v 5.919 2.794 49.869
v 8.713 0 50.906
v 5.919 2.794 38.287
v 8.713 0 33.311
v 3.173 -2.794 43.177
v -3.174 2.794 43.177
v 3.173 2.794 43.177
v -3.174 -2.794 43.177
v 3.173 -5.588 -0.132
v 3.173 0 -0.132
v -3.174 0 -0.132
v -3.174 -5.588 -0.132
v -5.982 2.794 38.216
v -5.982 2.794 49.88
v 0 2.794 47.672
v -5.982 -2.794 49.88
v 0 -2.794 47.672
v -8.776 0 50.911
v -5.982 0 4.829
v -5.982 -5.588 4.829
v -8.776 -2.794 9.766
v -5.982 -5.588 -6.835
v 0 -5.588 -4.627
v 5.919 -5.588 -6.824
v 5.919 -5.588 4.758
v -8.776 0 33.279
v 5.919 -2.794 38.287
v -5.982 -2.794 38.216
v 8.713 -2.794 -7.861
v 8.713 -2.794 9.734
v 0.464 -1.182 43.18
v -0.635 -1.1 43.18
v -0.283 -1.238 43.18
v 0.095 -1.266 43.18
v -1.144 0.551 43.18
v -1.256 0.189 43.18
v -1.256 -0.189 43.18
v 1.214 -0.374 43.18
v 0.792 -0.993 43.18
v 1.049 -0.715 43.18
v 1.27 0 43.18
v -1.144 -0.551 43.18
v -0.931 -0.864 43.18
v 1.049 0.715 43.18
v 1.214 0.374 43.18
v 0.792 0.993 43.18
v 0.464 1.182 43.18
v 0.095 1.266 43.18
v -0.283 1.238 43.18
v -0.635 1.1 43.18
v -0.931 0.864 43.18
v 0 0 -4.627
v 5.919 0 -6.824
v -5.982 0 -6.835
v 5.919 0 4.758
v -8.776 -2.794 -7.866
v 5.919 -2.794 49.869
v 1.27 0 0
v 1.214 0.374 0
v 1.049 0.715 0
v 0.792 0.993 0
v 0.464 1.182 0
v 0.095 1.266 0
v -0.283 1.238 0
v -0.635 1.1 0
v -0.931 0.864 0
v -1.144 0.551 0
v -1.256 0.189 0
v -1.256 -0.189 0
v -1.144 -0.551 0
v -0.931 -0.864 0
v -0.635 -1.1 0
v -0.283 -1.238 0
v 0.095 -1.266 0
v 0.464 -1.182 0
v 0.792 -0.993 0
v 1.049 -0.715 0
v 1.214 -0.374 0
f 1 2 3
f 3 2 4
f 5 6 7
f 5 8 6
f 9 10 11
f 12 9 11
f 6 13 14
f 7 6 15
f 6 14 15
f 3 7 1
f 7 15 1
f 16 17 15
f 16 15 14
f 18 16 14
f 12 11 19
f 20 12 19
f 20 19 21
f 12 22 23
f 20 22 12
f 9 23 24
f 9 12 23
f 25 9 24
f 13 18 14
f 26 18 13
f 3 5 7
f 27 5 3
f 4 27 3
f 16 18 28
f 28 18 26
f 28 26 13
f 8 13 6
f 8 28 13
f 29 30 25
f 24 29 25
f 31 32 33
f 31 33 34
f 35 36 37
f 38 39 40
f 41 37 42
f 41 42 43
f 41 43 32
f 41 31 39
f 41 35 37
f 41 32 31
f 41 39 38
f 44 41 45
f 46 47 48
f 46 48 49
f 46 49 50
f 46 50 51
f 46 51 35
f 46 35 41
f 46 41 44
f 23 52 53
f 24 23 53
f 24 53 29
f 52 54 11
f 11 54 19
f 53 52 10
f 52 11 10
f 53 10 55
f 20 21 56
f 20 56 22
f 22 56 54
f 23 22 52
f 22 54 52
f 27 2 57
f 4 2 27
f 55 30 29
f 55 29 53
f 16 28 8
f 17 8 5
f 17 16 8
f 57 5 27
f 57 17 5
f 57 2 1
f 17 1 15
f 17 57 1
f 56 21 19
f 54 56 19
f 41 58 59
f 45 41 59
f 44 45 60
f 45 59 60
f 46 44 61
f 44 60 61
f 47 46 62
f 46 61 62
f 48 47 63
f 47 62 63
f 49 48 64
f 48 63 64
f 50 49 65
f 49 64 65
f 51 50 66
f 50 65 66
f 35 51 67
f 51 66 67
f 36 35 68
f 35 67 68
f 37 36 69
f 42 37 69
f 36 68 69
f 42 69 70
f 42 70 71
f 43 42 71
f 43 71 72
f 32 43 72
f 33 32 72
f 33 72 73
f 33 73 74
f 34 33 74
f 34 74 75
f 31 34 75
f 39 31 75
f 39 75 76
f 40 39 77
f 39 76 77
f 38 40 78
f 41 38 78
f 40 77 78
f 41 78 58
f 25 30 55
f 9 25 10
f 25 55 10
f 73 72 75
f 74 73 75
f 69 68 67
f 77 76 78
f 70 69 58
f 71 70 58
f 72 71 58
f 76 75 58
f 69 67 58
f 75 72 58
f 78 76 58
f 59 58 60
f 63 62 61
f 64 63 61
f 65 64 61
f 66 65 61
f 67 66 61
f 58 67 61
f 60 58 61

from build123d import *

# Parameters (mm, degrees)
F0_R        = 1.27
F1_DEPTH    = 43.18
F3_DEPTH    = 2.794
F4_T1_DEPTH = 48.6435811926
F5_DEPTH    = 5.588
F6_T1_DEPTH = 48.6435811926


# Not quite as in the source:
# - a fillet or chamfer that OpenCascade refuses, or shapes differently, is made with other operations: its cross-section is extruded or revolved along the edge and cut away or added


with BuildPart() as f1:
    # F0 (on Top) → F1 (new body)
    with BuildSketch(Plane.XY):
        Circle(F0_R)
    extrude(amount=F1_DEPTH)


with BuildPart() as f3:
    # F2 (on Front) → F3 (new body, symmetric)
    with BuildSketch(Plane.XZ):
        Polygon((-3.1743557192, 43.1767851114), (3.1734784134, 43.1767851114), (10.9989056364, 29.2393378913), (10.9989056364, 51.7546199262), (0, 47.6719401777), (-11.0619841143, 51.7546199262), (-11.0619841143, 29.2393378913), align=None)
    extrude(amount=F3_DEPTH, both=True)

    # F4: chamfer of 5.08 on 4 edges, made by hand

    # F4_s2 → F4_t1 (cut)
    with BuildSketch(Plane.XY.offset(16.1751883125)):
        Polygon((10.9989056364, 2.286), (5.9189056364, -2.794), (10.9989056364, -2.794), align=None)
        Polygon((10.9989056364, -2.286), (5.9189056364, 2.794), (10.9989056364, 2.794), align=None)
        Polygon((-11.0619841143, 2.286), (-5.9819841143, -2.794), (-11.0619841143, -2.794), align=None)
        Polygon((-11.0619841143, -2.286), (-5.9819841143, 2.794), (-11.0619841143, 2.794), align=None)
    extrude(amount=F4_T1_DEPTH, mode=Mode.SUBTRACT)


with BuildPart() as f5:
    # F2 (on Front) → F5 (new body)
    with BuildSketch(Plane.XZ):
        Polygon((10.9989056364, 13.8055048883), (3.1734784134, -0.1319423318), (-3.1743557192, -0.1319423318), (-11.0619841143, 13.8055048883), (-11.0619841143, -8.7097771466), (0, -4.627097398), (10.9989056364, -8.7097771466), align=None)
    extrude(amount=F5_DEPTH)

    # F6: chamfer of 5.08 on 4 edges, made by hand

    # F6_s2 → F6_t1 (cut)
    with BuildSketch(Plane.XY.offset(-21.7739267254)):
        Polygon((-11.0619841143, -5.08), (-5.9819841143, 0), (-11.0619841143, 0), align=None)
        Polygon((-11.0619841143, -0.508), (-5.9819841143, -5.588), (-11.0619841143, -5.588), align=None)
        Polygon((10.9989056364, -0.508), (5.9189056364, -5.588), (10.9989056364, -5.588), align=None)
        Polygon((10.9989056364, -5.08), (5.9189056364, 0), (10.9989056364, 0), align=None)
    extrude(amount=F6_T1_DEPTH, mode=Mode.SUBTRACT)


solid = Compound([f1.part, f3.part, f5.part])
